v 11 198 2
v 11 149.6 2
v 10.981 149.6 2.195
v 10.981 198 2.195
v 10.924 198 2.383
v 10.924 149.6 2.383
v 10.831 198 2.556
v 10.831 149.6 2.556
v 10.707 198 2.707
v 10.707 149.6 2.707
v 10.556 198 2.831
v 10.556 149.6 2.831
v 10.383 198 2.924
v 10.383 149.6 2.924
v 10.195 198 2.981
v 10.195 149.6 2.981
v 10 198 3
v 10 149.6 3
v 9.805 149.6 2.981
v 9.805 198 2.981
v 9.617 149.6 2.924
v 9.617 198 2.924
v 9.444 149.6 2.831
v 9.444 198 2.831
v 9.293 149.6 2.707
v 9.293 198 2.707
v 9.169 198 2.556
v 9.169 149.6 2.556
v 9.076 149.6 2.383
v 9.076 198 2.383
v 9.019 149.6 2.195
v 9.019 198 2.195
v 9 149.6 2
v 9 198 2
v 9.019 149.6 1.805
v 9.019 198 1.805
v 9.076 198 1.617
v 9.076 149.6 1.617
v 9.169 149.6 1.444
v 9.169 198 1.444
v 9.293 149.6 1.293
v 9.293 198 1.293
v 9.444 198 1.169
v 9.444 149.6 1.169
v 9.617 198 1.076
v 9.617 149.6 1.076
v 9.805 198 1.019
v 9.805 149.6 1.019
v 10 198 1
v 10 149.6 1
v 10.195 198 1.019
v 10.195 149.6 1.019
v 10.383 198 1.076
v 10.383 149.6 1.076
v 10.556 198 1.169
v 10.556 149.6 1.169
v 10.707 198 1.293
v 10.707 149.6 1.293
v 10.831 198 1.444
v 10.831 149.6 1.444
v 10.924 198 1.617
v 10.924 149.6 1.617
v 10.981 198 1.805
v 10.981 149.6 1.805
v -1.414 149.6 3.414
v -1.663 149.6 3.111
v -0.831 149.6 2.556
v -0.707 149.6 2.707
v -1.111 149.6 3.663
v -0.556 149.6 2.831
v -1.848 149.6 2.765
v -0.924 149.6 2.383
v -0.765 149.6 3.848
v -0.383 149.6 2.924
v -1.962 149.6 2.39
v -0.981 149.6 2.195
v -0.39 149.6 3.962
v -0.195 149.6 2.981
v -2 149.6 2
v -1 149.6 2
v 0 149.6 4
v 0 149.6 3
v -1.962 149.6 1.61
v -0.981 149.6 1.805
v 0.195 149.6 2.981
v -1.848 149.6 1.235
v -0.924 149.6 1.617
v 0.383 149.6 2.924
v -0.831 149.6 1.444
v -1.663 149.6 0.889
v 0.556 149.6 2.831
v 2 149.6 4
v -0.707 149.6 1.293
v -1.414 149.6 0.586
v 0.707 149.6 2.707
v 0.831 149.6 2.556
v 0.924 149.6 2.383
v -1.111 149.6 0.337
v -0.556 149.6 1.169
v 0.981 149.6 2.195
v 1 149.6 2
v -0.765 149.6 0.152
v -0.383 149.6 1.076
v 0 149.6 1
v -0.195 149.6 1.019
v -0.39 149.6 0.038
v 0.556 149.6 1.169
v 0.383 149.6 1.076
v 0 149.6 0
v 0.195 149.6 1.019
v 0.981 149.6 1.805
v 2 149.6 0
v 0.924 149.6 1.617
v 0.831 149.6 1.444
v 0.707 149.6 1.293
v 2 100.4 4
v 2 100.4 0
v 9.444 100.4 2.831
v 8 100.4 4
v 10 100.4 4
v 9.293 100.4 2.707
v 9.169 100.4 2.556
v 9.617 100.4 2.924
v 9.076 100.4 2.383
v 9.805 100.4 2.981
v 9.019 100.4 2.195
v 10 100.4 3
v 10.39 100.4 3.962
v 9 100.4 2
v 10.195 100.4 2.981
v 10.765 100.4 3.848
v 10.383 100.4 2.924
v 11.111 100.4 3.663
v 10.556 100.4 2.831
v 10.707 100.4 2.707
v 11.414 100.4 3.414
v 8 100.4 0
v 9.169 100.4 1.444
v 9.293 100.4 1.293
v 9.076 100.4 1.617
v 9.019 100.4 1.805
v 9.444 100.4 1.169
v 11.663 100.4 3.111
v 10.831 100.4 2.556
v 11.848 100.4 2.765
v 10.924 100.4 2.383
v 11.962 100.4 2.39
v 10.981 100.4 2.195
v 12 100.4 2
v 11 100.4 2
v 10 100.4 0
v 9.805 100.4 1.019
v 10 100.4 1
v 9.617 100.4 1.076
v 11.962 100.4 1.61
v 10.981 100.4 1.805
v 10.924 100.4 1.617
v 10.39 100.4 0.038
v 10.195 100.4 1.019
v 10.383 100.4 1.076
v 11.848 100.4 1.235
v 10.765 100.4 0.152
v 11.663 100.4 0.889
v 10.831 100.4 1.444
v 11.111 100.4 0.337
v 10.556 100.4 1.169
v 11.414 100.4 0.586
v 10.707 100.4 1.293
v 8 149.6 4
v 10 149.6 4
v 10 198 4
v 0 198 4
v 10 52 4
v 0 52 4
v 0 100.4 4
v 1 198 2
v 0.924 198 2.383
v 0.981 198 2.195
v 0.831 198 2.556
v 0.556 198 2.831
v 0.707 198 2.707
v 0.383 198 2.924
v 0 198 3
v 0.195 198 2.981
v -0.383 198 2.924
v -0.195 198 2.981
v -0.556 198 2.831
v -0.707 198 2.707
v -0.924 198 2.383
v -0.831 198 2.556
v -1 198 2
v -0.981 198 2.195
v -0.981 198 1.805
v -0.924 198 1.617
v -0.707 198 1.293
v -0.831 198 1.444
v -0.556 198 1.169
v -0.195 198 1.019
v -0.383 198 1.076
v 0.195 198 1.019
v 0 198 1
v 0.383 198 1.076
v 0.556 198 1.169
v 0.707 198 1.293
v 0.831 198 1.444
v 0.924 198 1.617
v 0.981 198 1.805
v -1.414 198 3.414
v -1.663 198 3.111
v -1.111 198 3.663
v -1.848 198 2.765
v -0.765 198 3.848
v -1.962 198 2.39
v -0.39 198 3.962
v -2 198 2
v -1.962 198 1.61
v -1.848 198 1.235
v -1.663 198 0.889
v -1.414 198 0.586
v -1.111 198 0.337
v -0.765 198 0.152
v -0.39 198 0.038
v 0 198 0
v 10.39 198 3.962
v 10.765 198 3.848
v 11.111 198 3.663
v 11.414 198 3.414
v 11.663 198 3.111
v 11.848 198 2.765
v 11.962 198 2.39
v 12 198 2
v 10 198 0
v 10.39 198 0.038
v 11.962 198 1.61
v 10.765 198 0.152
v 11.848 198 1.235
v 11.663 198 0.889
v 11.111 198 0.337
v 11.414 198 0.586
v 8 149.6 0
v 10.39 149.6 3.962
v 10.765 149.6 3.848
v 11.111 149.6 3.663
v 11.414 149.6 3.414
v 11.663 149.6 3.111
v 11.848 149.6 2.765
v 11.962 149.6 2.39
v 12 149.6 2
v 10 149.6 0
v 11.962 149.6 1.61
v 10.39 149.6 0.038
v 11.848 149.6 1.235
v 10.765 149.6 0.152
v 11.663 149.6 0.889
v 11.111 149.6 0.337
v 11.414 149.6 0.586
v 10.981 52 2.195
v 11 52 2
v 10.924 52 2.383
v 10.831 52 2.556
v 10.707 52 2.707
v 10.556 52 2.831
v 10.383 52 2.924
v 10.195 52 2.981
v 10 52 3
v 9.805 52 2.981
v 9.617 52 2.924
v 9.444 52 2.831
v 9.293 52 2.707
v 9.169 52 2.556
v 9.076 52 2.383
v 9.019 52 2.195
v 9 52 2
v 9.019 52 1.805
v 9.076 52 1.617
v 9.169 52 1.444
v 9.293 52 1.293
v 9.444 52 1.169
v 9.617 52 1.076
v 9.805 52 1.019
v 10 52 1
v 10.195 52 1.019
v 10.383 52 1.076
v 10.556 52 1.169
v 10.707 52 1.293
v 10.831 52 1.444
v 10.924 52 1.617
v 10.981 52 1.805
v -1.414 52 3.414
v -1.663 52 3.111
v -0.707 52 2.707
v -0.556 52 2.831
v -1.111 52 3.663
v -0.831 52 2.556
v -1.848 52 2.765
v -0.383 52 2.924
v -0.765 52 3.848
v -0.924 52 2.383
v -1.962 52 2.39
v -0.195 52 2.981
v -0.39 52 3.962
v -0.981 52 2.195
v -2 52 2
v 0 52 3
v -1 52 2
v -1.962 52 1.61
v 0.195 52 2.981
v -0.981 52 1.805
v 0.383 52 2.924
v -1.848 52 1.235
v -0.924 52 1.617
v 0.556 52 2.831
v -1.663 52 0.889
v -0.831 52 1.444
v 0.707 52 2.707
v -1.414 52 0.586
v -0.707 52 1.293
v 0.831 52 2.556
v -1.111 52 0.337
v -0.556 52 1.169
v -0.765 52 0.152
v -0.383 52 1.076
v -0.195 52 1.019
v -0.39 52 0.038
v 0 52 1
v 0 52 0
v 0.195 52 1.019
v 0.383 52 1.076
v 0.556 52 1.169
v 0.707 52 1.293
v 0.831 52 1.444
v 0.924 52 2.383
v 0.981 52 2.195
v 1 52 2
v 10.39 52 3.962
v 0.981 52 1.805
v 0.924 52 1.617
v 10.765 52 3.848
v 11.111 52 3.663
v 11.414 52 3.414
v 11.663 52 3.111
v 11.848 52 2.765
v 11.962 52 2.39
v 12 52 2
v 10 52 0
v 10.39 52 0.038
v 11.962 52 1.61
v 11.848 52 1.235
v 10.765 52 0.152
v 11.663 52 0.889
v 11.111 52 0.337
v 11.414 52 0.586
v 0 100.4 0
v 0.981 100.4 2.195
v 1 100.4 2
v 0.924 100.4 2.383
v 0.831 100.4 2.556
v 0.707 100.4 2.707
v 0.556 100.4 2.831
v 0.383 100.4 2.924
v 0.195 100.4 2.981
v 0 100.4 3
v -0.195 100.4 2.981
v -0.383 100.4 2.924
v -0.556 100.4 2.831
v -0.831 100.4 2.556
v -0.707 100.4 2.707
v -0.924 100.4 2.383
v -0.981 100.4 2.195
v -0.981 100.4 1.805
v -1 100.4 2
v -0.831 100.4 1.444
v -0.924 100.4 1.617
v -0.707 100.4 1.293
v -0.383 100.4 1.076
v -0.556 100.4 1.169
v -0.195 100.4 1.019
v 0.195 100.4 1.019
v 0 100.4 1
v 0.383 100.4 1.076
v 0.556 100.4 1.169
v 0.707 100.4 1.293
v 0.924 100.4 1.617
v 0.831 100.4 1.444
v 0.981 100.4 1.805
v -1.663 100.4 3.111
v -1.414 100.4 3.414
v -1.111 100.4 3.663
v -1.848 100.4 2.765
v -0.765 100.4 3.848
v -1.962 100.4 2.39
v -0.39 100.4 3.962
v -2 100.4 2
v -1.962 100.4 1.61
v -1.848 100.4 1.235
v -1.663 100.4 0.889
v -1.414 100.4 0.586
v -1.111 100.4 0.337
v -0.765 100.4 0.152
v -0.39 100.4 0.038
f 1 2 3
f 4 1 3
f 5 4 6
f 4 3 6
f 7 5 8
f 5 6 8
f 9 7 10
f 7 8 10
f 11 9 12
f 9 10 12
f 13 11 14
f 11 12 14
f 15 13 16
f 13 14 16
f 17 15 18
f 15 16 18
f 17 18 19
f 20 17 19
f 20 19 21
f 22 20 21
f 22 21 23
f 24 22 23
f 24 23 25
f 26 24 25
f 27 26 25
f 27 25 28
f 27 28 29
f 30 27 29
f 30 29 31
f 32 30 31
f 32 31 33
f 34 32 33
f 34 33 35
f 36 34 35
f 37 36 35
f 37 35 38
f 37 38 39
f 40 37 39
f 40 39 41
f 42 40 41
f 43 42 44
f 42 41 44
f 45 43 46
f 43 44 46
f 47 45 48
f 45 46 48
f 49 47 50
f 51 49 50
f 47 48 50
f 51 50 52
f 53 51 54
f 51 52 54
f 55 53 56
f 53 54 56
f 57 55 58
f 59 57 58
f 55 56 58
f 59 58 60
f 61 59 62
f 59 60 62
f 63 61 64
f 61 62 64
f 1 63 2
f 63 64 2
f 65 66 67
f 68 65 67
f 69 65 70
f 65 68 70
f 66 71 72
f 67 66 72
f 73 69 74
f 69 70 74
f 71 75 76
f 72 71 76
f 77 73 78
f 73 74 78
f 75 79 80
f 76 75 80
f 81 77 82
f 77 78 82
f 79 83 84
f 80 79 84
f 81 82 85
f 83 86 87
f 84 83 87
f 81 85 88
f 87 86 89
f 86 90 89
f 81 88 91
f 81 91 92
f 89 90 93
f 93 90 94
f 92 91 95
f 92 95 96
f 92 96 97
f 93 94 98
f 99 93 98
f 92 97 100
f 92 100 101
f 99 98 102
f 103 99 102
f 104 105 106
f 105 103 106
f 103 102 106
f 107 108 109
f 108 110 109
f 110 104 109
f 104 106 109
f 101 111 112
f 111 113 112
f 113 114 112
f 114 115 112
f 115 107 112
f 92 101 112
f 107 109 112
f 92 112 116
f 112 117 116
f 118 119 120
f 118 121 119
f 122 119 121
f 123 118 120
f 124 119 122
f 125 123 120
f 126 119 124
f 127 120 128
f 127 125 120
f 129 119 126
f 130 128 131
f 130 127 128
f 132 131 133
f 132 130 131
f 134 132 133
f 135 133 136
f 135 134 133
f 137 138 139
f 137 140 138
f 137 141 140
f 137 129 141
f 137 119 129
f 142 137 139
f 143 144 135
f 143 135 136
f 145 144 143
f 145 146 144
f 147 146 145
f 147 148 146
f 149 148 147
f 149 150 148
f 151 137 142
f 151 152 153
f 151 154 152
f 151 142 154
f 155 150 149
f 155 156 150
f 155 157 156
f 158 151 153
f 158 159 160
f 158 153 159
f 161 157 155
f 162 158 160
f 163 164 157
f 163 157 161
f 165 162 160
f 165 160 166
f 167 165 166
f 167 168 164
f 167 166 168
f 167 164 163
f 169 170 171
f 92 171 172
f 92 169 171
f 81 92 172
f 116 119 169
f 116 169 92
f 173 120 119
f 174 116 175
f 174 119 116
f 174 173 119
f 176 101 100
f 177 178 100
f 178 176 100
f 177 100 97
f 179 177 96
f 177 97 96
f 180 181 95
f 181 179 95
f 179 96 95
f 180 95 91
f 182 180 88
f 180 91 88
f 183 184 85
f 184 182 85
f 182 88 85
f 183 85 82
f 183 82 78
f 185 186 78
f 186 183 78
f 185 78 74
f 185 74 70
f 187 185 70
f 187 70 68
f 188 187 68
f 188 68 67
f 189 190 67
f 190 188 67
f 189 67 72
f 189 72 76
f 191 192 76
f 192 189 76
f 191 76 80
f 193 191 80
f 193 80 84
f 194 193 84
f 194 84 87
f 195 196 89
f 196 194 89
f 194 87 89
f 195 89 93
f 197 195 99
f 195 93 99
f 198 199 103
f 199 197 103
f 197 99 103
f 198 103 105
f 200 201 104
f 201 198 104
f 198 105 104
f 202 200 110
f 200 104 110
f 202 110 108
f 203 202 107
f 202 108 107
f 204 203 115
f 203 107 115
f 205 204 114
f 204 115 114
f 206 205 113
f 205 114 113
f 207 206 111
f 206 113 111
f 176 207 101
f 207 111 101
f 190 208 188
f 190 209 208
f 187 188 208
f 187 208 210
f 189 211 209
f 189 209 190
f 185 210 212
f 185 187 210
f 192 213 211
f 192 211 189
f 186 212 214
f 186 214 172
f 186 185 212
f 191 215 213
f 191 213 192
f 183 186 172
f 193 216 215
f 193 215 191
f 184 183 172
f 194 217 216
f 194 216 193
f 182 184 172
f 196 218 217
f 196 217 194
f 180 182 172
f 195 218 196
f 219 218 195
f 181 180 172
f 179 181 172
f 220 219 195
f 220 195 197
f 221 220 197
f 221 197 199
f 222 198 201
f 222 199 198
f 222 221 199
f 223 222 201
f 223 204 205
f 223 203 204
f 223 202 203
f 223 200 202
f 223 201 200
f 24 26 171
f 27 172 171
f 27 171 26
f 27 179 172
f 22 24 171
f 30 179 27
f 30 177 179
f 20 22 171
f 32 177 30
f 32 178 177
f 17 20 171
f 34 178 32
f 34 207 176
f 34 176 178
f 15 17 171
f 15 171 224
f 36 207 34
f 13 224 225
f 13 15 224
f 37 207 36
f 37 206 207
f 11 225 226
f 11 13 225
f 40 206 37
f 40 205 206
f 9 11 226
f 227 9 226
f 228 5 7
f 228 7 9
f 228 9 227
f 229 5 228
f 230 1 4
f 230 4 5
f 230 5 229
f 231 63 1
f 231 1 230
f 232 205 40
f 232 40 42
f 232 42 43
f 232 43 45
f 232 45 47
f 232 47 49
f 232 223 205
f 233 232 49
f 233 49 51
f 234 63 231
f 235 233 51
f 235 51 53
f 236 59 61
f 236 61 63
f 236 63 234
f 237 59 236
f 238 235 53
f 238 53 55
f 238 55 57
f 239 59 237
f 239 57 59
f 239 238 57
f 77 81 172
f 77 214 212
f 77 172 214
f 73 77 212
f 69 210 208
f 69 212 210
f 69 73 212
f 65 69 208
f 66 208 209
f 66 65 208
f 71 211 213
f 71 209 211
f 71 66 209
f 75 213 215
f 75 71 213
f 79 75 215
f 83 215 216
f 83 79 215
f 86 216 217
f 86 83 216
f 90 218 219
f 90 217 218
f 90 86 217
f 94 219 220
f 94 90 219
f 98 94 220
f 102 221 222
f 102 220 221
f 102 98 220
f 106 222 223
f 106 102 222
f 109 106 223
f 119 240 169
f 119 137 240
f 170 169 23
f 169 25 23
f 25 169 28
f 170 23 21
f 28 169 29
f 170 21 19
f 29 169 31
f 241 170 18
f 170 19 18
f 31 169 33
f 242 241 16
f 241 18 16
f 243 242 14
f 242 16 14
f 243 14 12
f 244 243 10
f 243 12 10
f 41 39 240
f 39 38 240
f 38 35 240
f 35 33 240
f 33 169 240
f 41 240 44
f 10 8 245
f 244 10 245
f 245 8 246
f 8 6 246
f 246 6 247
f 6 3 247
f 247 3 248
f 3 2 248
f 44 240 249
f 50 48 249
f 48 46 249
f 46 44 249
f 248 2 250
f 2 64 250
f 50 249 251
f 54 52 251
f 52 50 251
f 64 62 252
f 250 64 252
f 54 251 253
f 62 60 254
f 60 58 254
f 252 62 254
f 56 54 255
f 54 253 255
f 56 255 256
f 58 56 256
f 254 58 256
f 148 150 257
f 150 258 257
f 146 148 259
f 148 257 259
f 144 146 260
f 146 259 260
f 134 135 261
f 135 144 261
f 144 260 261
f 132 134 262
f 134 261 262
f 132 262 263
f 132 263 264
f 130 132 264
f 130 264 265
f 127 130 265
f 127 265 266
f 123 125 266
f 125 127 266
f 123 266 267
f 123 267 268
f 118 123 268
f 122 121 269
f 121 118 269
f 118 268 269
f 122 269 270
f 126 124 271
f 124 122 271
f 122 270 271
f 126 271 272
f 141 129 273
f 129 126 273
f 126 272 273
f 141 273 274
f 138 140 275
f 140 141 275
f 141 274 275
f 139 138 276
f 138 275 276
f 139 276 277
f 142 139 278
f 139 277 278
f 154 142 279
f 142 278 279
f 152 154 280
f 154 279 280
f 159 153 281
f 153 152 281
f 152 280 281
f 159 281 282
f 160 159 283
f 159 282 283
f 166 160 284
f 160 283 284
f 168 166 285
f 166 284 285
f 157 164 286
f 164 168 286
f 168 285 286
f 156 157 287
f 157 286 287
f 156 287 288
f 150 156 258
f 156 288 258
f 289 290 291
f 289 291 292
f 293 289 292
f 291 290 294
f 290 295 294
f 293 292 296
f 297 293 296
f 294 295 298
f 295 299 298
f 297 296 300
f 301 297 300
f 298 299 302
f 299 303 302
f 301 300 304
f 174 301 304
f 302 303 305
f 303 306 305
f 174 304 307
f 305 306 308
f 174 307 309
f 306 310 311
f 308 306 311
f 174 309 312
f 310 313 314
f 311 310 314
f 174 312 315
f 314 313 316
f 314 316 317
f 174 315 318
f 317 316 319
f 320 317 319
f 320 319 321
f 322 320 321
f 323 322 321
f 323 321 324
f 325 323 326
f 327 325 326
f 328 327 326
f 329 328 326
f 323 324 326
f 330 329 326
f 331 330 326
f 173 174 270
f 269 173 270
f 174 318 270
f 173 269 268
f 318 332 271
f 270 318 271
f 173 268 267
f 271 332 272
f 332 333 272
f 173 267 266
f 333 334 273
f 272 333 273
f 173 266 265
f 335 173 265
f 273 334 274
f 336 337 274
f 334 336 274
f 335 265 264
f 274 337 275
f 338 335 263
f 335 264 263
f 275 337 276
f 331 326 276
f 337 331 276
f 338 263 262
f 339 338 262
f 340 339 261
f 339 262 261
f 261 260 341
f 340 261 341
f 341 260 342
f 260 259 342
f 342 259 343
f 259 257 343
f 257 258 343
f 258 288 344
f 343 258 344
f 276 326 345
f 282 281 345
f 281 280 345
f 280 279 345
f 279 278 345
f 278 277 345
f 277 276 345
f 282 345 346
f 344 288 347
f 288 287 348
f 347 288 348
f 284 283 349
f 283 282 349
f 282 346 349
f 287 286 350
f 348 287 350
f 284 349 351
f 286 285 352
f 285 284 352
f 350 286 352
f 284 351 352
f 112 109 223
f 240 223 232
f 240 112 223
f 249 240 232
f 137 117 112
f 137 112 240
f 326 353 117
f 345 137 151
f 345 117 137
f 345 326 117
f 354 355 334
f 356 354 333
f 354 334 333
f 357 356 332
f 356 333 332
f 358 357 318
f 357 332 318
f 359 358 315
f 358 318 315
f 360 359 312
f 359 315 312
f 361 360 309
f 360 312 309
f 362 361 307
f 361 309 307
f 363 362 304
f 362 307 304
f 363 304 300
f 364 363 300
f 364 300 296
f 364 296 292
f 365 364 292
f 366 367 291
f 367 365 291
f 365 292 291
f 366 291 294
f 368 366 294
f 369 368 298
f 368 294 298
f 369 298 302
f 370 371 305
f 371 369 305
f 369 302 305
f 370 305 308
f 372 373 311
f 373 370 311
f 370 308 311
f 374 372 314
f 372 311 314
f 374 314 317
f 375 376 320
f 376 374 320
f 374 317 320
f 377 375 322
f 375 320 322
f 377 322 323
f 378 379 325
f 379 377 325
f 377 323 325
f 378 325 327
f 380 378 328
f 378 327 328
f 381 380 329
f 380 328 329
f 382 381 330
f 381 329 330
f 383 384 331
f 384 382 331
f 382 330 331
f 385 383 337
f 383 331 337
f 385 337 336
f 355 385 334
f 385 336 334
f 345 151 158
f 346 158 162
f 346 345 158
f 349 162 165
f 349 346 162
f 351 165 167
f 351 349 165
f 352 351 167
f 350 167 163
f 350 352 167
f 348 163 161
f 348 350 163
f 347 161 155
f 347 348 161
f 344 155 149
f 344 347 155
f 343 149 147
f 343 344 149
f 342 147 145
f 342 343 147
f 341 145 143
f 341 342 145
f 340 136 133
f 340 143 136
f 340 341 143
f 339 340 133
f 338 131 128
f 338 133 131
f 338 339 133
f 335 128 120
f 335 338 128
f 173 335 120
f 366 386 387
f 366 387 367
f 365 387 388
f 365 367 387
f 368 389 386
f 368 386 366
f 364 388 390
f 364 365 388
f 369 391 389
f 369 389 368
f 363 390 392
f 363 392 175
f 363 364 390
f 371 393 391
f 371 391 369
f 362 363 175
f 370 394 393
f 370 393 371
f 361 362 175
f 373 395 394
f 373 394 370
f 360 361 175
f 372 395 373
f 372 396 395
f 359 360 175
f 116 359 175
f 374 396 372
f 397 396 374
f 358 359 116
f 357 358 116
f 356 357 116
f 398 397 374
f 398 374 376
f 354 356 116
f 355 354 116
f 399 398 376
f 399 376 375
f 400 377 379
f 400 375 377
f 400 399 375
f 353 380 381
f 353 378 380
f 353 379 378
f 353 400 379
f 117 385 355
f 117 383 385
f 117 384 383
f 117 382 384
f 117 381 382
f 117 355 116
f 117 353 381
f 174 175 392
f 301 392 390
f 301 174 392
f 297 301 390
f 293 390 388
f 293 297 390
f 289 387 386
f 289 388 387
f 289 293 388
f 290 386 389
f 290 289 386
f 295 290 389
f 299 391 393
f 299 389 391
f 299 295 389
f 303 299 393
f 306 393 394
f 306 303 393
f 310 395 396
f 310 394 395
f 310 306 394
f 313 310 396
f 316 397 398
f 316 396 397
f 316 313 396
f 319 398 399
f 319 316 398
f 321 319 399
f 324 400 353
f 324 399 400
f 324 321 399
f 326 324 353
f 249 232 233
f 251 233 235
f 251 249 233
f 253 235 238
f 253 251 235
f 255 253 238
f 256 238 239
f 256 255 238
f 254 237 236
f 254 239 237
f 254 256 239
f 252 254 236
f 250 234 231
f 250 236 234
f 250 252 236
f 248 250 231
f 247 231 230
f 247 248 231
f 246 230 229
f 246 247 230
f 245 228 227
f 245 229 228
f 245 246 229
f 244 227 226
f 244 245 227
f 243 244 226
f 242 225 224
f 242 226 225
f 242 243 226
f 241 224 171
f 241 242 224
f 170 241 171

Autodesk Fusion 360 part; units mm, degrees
sketch "Sketch1" plane through (0, 0, 0) normal (0, 1, 0) x (1, 0, 0)
  line L0 (0, 0) -> (10, 0)
  line L1 (10, 0) -> (10, -4)
  line L2 (10, -4) -> (0, -4)
  line L3 (0, -4) -> (0, 0)
  circle A0 centre (0, -2) radius 2
  circle A1 centre (10, -2) radius 2
  circle A2 centre (0, -2) radius 1
  circle A3 centre (10, -2) radius 1
  dimension "d1" = 10
  dimension "d2" = 4
  dimension "d5" = 2
  dimension "d6" = 2
extrude "Extrude1" add sketch "Sketch1" along normal blind 250 contours L3 A0 A2 | L0 L2 A0 A1 | L3 A0 A2 | L1 A1 A3 | L1 A1 A3
ref_plane "WorkPlane1" through (0, 51.2, 0) normal (0, 1, 0) x (0, 0, 1)
sketch "Sketch3" plane through (0, 51.2, 0) normal (0, 1, 0) x (1, 0, 0)
  line L0 (8, -4) -> (8, 0)
  line L1 (10, -4) -> (0, -4)
  line L2 (0, 0) -> (10, 0)
  line L3 (8, -4) -> (10, -4)
  line L4 (8, 0) -> (10, 0)
  circle A0 centre (10, -2) radius 1
  circle A1 centre (10, -2) radius 1
  circle A2 centre (10, -2) radius 2
  arc A3 (10, -4) -> (10, 0) centre (10, -2) ccw
  line L5 (5, 0) -> (5, -4)
  circle A4 centre (0, -2) radius 2
  circle A5 centre (0, -2) radius 1
  line L6 (2, -4) -> (0, -4)
  line L7 (2, -4) -> (2, 0)
  line L8 (2, 0) -> (0, 0)
  dimension "d15" = 2
extrude "Extrude3" cut sketch "Sketch3" against normal blind 49.2 contours L0 L1 L3 A2 | L0 L2 L4 A2 | A2 A3 | L1 A4 L6 L7 | A4 | L2 A4 L7 L8
ref_plane "WorkPlane2" through (0, 125, 0) normal (0, 1, 0) x (0, 0, 1)
mirror "Mirror1" about plane through (0, 125, 0) normal (0, 1, 0) of "Extrude3"
sketch "Sketch4" plane through (0, 125, 0) normal (0, 1, 0) x (1, 0, 0)
  circle A0 centre (10, -2) radius 1
  circle A1 centre (10, -2) radius 2
  circle A2 centre (0, -2) radius 1
  circle A3 centre (0, -2) radius 2
  circle A4 centre (10, -2) radius 1
  arc A5 (10, -4) -> (10, 0) centre (10, -2) ccw
  arc A6 (0, 0) -> (0, -4) centre (0, -2) ccw
  circle A7 centre (0, -2) radius 1
  line L0 (10, -4) -> (0, -4)
  line L1 (0, 0) -> (10, 0)
  line L2 (5, -4) -> (5, 0)
  line L3 (10, 0) -> (8, 0)
  line L4 (8, 0) -> (8, -4)
  line L5 (2, 0) -> (2, -4)
  dimension "d41" = 2
extrude "Extrude8" cut sketch "Sketch4" along normal blind 24.6 and the other way blind 24.6 contours A1 A5 | A1 L1 L3 L4 | A1 L0 L4 | A3 L1 L5 | A3 L0 L5 | A3 A6
extrude "Extrude5" cut 1 faces at (3.6087, 0, 0.4789) along direction (0, 1, 0) blind 52
extrude "Extrude6" cut 1 faces at (3.6087, 250, 0.4789) along direction (0, -1, 0) blind 52
fillet "Fillet2" [suppressed]
equation "d7 = 2 mm + 49.2 mm"
